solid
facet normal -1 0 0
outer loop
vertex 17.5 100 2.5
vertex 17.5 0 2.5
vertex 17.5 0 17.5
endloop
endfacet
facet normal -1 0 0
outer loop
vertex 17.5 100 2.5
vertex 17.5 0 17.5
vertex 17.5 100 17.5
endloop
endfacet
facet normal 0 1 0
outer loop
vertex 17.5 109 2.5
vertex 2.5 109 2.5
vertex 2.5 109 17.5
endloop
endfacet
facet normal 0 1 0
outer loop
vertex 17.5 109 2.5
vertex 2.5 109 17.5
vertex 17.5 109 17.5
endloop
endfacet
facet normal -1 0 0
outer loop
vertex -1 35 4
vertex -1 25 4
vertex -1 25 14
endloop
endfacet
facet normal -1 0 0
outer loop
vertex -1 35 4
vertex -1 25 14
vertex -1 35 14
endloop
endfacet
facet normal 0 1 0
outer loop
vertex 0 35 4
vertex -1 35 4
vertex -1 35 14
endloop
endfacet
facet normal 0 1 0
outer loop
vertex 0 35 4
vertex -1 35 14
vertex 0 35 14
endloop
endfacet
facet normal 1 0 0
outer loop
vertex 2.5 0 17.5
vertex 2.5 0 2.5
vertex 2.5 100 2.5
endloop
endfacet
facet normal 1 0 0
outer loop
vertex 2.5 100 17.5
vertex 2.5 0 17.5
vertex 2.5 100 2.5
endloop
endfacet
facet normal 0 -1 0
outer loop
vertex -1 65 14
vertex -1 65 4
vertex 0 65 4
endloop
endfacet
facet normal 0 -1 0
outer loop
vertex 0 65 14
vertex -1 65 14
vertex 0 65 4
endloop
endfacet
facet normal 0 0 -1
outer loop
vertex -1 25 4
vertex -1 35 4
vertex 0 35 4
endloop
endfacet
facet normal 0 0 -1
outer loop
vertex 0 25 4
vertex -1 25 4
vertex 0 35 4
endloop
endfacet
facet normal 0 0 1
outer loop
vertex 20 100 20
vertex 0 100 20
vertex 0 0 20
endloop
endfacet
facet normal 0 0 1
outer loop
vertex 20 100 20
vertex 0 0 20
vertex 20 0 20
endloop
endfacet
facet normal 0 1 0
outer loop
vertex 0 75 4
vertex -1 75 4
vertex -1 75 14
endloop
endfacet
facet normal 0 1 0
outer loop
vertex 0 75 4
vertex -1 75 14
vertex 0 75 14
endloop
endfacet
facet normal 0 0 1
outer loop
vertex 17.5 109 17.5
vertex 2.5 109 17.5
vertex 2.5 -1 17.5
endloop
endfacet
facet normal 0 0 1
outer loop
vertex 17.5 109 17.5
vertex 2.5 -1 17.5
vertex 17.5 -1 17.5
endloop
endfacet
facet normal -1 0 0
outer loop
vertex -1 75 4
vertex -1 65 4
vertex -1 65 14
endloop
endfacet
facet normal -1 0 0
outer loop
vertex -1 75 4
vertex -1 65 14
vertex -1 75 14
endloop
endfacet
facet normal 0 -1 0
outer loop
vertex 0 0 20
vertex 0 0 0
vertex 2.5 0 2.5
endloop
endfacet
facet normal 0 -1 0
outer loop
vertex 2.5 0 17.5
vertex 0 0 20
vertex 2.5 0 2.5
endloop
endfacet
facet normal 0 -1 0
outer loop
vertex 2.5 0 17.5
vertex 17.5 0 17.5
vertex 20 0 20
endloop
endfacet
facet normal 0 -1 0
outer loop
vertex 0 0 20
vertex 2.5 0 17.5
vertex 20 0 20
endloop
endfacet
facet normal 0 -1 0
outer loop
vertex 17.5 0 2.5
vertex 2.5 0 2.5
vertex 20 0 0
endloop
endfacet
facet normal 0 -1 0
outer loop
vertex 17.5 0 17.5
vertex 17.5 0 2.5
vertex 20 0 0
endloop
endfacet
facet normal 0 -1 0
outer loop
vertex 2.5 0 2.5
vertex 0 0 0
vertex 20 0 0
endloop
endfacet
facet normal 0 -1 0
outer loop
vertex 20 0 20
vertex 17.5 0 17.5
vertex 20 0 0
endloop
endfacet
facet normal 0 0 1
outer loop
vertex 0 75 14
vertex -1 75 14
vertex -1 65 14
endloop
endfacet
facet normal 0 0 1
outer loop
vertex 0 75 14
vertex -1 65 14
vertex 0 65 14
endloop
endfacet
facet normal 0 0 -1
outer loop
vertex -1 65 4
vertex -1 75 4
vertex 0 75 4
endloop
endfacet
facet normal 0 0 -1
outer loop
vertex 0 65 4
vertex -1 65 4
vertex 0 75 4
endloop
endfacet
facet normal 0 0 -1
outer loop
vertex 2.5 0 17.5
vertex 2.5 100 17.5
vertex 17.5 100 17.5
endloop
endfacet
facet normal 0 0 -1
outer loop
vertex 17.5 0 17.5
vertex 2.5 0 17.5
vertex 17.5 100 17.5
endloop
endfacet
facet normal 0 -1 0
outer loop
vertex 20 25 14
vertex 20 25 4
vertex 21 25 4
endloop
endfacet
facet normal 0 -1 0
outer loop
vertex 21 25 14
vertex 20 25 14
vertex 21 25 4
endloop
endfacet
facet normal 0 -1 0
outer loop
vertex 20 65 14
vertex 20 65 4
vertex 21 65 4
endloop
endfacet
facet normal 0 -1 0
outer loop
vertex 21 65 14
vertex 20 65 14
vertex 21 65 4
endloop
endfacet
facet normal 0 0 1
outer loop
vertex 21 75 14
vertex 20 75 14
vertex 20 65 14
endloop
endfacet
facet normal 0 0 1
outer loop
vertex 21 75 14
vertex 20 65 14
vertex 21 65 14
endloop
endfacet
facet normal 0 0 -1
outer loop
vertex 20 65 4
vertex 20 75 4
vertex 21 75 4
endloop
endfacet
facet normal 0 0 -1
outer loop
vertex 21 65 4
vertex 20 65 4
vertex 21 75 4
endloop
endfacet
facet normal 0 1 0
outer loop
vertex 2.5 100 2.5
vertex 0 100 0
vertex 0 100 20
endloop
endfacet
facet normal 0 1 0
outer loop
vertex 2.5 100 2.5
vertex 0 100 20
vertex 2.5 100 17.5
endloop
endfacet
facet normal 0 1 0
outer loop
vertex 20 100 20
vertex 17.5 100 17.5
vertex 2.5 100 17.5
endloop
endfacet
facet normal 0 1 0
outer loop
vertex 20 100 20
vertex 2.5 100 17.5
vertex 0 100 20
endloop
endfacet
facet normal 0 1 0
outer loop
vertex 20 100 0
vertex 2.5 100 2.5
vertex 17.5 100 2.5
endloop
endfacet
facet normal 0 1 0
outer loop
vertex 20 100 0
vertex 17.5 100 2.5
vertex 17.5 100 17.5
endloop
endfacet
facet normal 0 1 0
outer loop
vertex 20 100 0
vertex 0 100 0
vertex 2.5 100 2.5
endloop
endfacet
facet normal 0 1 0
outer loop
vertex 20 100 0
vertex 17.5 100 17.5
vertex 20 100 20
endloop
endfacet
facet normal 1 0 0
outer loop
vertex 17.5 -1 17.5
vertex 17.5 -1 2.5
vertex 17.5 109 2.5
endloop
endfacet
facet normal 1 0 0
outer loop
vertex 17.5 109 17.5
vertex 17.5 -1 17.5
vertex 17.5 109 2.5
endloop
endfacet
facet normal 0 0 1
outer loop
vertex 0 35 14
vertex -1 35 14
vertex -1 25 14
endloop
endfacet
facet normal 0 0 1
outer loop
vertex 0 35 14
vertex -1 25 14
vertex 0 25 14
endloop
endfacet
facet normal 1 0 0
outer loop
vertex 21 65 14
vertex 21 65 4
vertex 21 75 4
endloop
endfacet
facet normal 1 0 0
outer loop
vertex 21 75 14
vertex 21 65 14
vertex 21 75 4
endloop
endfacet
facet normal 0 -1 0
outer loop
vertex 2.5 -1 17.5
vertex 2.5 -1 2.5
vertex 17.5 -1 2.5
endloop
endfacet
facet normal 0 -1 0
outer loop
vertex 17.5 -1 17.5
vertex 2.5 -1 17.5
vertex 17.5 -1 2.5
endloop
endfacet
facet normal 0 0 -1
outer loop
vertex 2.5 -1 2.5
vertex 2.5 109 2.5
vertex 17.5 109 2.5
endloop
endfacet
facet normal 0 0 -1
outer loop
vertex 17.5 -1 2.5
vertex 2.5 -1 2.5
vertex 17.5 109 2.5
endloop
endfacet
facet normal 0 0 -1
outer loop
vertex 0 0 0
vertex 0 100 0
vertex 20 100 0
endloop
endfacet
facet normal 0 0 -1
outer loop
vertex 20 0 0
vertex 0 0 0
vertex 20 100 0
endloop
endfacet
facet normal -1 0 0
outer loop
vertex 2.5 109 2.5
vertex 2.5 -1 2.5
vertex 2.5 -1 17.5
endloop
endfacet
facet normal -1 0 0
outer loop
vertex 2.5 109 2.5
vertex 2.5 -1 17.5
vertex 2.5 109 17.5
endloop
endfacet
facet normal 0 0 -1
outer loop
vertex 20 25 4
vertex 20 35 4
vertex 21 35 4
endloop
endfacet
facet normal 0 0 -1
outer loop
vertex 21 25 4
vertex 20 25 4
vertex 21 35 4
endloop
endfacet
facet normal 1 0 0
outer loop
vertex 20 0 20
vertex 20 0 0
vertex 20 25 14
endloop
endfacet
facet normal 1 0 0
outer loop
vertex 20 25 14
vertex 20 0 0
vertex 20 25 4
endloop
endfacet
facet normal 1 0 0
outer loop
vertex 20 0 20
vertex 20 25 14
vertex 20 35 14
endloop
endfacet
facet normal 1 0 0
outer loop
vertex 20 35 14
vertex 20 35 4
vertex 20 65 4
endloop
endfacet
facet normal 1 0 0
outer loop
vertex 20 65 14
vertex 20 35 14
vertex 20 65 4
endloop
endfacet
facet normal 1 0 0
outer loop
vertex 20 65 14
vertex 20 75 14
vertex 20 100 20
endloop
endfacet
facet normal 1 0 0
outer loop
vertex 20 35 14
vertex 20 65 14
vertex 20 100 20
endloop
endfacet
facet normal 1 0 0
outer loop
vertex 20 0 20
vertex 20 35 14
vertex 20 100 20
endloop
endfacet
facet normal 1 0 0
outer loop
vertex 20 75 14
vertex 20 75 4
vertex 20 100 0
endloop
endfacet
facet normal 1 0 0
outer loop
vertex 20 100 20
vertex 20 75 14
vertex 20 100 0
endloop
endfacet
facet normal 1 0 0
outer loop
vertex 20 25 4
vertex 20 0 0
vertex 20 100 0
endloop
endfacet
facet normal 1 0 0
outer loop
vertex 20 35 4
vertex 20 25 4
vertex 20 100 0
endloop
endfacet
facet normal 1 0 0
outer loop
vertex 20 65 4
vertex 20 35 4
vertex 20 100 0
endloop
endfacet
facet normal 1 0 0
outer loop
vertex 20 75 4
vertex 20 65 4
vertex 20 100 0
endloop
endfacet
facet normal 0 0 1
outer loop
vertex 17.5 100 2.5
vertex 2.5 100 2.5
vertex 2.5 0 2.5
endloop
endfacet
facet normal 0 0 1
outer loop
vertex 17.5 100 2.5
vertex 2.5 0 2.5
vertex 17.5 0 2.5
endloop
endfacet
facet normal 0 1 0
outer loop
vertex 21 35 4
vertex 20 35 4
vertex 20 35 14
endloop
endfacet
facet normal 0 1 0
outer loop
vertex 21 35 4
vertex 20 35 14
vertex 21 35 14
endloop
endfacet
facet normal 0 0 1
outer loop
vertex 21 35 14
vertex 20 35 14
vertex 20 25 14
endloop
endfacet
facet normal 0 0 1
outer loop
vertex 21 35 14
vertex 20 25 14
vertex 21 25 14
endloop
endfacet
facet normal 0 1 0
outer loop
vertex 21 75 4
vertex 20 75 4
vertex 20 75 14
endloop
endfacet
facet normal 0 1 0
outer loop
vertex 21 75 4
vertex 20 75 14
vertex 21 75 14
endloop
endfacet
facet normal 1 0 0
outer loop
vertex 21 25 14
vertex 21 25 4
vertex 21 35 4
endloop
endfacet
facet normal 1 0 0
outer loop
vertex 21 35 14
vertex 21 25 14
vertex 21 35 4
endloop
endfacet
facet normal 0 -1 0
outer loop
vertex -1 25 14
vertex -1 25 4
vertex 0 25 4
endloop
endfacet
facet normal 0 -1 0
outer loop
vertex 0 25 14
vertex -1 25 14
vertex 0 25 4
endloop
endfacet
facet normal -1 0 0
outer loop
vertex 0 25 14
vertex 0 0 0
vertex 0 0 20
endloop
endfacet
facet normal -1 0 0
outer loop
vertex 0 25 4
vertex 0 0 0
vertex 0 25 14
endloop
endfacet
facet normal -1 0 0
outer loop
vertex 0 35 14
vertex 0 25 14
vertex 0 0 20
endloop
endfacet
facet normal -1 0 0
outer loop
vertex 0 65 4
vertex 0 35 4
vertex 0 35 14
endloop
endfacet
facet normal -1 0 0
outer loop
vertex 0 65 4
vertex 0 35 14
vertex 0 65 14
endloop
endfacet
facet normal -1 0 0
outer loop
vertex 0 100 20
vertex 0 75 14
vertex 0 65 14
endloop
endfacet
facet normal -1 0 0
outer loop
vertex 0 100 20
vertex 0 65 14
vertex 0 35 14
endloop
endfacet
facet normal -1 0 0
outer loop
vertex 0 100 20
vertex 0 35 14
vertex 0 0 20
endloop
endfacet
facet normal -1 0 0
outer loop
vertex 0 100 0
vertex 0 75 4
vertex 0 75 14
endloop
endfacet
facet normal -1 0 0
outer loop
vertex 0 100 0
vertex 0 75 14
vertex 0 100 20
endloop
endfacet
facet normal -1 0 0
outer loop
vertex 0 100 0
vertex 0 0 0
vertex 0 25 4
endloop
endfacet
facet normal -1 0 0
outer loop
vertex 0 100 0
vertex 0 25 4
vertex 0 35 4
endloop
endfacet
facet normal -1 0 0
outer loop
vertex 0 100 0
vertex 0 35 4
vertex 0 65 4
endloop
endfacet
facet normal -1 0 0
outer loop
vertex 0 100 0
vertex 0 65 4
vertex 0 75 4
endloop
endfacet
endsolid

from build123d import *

# Parameters (mm, degrees)
BOX002_W     = 1
BOX002_H     = 10
BOX002_DEPTH = 10
BOX003_W     = 1
BOX003_H     = 10
BOX003_DEPTH = 10
BOX004_W     = 1
BOX004_H     = 10
BOX004_DEPTH = 10
BOX005_W     = 1
BOX005_H     = 10
BOX005_DEPTH = 10
BOX001_W     = 15
BOX001_H     = 110
BOX001_DEPTH = 15
BOX_W        = 20
BOX_H        = 100
BOX_DEPTH    = 20
BOX006_W     = 15
BOX006_H     = 110
BOX006_DEPTH = 15


with BuildPart() as cube002:
    # Box002 → Box002 (new body)
    with BuildSketch(Plane(origin=(20, 25, 4), x_dir=(1, 0, 0), z_dir=(0, 0, 1))):
        with Locations((0.5, 5)):
            Rectangle(BOX002_W, BOX002_H)
    extrude(amount=BOX002_DEPTH)


with BuildPart() as cube003:
    # Box003 → Box003 (new body)
    with BuildSketch(Plane(origin=(20, 65, 4), x_dir=(1, 0, 0), z_dir=(0, 0, 1))):
        with Locations((0.5, 5)):
            Rectangle(BOX003_W, BOX003_H)
    extrude(amount=BOX003_DEPTH)


with BuildPart() as cube004:
    # Box004 → Box004 (new body)
    with BuildSketch(Plane(origin=(-1, 65, 4), x_dir=(1, 0, 0), z_dir=(0, 0, 1))):
        with Locations((0.5, 5)):
            Rectangle(BOX004_W, BOX004_H)
    extrude(amount=BOX004_DEPTH)


with BuildPart() as cube005:
    # Box005 → Box005 (new body)
    with BuildSketch(Plane(origin=(-1, 25, 4), x_dir=(1, 0, 0), z_dir=(0, 0, 1))):
        with Locations((0.5, 5)):
            Rectangle(BOX005_W, BOX005_H)
    extrude(amount=BOX005_DEPTH)


with BuildPart() as cube001:
    # Box001 → Box001 (new body)
    with BuildSketch(Plane(origin=(2.5, -1, 2.5), x_dir=(1, 0, 0), z_dir=(0, 0, 1))):
        with Locations((7.5, 55)):
            Rectangle(BOX001_W, BOX001_H)
    extrude(amount=BOX001_DEPTH)


with BuildPart() as fusion:
    # Box → Box (new body)
    with BuildSketch(Plane.XY):
        with Locations((10, 50)):
            Rectangle(BOX_W, BOX_H)
    extrude(amount=BOX_DEPTH)

    # Cut: cut Cube001
    add(cube001.part, mode=Mode.SUBTRACT)

    # Fusion: union Cube002, Cube003, Cube004, Cube005
    add(cube002.part)
    add(cube003.part)
    add(cube004.part)
    add(cube005.part)


with BuildPart() as cube006:
    # Box006 → Box006 (new body)
    with BuildSketch(Plane(origin=(2.5, -1, 2.5), x_dir=(1, 0, 0), z_dir=(0, 0, 1))):
        with Locations((7.5, 55)):
            Rectangle(BOX006_W, BOX006_H)
    extrude(amount=BOX006_DEPTH)


solid = Compound([fusion.part, cube006.part])
